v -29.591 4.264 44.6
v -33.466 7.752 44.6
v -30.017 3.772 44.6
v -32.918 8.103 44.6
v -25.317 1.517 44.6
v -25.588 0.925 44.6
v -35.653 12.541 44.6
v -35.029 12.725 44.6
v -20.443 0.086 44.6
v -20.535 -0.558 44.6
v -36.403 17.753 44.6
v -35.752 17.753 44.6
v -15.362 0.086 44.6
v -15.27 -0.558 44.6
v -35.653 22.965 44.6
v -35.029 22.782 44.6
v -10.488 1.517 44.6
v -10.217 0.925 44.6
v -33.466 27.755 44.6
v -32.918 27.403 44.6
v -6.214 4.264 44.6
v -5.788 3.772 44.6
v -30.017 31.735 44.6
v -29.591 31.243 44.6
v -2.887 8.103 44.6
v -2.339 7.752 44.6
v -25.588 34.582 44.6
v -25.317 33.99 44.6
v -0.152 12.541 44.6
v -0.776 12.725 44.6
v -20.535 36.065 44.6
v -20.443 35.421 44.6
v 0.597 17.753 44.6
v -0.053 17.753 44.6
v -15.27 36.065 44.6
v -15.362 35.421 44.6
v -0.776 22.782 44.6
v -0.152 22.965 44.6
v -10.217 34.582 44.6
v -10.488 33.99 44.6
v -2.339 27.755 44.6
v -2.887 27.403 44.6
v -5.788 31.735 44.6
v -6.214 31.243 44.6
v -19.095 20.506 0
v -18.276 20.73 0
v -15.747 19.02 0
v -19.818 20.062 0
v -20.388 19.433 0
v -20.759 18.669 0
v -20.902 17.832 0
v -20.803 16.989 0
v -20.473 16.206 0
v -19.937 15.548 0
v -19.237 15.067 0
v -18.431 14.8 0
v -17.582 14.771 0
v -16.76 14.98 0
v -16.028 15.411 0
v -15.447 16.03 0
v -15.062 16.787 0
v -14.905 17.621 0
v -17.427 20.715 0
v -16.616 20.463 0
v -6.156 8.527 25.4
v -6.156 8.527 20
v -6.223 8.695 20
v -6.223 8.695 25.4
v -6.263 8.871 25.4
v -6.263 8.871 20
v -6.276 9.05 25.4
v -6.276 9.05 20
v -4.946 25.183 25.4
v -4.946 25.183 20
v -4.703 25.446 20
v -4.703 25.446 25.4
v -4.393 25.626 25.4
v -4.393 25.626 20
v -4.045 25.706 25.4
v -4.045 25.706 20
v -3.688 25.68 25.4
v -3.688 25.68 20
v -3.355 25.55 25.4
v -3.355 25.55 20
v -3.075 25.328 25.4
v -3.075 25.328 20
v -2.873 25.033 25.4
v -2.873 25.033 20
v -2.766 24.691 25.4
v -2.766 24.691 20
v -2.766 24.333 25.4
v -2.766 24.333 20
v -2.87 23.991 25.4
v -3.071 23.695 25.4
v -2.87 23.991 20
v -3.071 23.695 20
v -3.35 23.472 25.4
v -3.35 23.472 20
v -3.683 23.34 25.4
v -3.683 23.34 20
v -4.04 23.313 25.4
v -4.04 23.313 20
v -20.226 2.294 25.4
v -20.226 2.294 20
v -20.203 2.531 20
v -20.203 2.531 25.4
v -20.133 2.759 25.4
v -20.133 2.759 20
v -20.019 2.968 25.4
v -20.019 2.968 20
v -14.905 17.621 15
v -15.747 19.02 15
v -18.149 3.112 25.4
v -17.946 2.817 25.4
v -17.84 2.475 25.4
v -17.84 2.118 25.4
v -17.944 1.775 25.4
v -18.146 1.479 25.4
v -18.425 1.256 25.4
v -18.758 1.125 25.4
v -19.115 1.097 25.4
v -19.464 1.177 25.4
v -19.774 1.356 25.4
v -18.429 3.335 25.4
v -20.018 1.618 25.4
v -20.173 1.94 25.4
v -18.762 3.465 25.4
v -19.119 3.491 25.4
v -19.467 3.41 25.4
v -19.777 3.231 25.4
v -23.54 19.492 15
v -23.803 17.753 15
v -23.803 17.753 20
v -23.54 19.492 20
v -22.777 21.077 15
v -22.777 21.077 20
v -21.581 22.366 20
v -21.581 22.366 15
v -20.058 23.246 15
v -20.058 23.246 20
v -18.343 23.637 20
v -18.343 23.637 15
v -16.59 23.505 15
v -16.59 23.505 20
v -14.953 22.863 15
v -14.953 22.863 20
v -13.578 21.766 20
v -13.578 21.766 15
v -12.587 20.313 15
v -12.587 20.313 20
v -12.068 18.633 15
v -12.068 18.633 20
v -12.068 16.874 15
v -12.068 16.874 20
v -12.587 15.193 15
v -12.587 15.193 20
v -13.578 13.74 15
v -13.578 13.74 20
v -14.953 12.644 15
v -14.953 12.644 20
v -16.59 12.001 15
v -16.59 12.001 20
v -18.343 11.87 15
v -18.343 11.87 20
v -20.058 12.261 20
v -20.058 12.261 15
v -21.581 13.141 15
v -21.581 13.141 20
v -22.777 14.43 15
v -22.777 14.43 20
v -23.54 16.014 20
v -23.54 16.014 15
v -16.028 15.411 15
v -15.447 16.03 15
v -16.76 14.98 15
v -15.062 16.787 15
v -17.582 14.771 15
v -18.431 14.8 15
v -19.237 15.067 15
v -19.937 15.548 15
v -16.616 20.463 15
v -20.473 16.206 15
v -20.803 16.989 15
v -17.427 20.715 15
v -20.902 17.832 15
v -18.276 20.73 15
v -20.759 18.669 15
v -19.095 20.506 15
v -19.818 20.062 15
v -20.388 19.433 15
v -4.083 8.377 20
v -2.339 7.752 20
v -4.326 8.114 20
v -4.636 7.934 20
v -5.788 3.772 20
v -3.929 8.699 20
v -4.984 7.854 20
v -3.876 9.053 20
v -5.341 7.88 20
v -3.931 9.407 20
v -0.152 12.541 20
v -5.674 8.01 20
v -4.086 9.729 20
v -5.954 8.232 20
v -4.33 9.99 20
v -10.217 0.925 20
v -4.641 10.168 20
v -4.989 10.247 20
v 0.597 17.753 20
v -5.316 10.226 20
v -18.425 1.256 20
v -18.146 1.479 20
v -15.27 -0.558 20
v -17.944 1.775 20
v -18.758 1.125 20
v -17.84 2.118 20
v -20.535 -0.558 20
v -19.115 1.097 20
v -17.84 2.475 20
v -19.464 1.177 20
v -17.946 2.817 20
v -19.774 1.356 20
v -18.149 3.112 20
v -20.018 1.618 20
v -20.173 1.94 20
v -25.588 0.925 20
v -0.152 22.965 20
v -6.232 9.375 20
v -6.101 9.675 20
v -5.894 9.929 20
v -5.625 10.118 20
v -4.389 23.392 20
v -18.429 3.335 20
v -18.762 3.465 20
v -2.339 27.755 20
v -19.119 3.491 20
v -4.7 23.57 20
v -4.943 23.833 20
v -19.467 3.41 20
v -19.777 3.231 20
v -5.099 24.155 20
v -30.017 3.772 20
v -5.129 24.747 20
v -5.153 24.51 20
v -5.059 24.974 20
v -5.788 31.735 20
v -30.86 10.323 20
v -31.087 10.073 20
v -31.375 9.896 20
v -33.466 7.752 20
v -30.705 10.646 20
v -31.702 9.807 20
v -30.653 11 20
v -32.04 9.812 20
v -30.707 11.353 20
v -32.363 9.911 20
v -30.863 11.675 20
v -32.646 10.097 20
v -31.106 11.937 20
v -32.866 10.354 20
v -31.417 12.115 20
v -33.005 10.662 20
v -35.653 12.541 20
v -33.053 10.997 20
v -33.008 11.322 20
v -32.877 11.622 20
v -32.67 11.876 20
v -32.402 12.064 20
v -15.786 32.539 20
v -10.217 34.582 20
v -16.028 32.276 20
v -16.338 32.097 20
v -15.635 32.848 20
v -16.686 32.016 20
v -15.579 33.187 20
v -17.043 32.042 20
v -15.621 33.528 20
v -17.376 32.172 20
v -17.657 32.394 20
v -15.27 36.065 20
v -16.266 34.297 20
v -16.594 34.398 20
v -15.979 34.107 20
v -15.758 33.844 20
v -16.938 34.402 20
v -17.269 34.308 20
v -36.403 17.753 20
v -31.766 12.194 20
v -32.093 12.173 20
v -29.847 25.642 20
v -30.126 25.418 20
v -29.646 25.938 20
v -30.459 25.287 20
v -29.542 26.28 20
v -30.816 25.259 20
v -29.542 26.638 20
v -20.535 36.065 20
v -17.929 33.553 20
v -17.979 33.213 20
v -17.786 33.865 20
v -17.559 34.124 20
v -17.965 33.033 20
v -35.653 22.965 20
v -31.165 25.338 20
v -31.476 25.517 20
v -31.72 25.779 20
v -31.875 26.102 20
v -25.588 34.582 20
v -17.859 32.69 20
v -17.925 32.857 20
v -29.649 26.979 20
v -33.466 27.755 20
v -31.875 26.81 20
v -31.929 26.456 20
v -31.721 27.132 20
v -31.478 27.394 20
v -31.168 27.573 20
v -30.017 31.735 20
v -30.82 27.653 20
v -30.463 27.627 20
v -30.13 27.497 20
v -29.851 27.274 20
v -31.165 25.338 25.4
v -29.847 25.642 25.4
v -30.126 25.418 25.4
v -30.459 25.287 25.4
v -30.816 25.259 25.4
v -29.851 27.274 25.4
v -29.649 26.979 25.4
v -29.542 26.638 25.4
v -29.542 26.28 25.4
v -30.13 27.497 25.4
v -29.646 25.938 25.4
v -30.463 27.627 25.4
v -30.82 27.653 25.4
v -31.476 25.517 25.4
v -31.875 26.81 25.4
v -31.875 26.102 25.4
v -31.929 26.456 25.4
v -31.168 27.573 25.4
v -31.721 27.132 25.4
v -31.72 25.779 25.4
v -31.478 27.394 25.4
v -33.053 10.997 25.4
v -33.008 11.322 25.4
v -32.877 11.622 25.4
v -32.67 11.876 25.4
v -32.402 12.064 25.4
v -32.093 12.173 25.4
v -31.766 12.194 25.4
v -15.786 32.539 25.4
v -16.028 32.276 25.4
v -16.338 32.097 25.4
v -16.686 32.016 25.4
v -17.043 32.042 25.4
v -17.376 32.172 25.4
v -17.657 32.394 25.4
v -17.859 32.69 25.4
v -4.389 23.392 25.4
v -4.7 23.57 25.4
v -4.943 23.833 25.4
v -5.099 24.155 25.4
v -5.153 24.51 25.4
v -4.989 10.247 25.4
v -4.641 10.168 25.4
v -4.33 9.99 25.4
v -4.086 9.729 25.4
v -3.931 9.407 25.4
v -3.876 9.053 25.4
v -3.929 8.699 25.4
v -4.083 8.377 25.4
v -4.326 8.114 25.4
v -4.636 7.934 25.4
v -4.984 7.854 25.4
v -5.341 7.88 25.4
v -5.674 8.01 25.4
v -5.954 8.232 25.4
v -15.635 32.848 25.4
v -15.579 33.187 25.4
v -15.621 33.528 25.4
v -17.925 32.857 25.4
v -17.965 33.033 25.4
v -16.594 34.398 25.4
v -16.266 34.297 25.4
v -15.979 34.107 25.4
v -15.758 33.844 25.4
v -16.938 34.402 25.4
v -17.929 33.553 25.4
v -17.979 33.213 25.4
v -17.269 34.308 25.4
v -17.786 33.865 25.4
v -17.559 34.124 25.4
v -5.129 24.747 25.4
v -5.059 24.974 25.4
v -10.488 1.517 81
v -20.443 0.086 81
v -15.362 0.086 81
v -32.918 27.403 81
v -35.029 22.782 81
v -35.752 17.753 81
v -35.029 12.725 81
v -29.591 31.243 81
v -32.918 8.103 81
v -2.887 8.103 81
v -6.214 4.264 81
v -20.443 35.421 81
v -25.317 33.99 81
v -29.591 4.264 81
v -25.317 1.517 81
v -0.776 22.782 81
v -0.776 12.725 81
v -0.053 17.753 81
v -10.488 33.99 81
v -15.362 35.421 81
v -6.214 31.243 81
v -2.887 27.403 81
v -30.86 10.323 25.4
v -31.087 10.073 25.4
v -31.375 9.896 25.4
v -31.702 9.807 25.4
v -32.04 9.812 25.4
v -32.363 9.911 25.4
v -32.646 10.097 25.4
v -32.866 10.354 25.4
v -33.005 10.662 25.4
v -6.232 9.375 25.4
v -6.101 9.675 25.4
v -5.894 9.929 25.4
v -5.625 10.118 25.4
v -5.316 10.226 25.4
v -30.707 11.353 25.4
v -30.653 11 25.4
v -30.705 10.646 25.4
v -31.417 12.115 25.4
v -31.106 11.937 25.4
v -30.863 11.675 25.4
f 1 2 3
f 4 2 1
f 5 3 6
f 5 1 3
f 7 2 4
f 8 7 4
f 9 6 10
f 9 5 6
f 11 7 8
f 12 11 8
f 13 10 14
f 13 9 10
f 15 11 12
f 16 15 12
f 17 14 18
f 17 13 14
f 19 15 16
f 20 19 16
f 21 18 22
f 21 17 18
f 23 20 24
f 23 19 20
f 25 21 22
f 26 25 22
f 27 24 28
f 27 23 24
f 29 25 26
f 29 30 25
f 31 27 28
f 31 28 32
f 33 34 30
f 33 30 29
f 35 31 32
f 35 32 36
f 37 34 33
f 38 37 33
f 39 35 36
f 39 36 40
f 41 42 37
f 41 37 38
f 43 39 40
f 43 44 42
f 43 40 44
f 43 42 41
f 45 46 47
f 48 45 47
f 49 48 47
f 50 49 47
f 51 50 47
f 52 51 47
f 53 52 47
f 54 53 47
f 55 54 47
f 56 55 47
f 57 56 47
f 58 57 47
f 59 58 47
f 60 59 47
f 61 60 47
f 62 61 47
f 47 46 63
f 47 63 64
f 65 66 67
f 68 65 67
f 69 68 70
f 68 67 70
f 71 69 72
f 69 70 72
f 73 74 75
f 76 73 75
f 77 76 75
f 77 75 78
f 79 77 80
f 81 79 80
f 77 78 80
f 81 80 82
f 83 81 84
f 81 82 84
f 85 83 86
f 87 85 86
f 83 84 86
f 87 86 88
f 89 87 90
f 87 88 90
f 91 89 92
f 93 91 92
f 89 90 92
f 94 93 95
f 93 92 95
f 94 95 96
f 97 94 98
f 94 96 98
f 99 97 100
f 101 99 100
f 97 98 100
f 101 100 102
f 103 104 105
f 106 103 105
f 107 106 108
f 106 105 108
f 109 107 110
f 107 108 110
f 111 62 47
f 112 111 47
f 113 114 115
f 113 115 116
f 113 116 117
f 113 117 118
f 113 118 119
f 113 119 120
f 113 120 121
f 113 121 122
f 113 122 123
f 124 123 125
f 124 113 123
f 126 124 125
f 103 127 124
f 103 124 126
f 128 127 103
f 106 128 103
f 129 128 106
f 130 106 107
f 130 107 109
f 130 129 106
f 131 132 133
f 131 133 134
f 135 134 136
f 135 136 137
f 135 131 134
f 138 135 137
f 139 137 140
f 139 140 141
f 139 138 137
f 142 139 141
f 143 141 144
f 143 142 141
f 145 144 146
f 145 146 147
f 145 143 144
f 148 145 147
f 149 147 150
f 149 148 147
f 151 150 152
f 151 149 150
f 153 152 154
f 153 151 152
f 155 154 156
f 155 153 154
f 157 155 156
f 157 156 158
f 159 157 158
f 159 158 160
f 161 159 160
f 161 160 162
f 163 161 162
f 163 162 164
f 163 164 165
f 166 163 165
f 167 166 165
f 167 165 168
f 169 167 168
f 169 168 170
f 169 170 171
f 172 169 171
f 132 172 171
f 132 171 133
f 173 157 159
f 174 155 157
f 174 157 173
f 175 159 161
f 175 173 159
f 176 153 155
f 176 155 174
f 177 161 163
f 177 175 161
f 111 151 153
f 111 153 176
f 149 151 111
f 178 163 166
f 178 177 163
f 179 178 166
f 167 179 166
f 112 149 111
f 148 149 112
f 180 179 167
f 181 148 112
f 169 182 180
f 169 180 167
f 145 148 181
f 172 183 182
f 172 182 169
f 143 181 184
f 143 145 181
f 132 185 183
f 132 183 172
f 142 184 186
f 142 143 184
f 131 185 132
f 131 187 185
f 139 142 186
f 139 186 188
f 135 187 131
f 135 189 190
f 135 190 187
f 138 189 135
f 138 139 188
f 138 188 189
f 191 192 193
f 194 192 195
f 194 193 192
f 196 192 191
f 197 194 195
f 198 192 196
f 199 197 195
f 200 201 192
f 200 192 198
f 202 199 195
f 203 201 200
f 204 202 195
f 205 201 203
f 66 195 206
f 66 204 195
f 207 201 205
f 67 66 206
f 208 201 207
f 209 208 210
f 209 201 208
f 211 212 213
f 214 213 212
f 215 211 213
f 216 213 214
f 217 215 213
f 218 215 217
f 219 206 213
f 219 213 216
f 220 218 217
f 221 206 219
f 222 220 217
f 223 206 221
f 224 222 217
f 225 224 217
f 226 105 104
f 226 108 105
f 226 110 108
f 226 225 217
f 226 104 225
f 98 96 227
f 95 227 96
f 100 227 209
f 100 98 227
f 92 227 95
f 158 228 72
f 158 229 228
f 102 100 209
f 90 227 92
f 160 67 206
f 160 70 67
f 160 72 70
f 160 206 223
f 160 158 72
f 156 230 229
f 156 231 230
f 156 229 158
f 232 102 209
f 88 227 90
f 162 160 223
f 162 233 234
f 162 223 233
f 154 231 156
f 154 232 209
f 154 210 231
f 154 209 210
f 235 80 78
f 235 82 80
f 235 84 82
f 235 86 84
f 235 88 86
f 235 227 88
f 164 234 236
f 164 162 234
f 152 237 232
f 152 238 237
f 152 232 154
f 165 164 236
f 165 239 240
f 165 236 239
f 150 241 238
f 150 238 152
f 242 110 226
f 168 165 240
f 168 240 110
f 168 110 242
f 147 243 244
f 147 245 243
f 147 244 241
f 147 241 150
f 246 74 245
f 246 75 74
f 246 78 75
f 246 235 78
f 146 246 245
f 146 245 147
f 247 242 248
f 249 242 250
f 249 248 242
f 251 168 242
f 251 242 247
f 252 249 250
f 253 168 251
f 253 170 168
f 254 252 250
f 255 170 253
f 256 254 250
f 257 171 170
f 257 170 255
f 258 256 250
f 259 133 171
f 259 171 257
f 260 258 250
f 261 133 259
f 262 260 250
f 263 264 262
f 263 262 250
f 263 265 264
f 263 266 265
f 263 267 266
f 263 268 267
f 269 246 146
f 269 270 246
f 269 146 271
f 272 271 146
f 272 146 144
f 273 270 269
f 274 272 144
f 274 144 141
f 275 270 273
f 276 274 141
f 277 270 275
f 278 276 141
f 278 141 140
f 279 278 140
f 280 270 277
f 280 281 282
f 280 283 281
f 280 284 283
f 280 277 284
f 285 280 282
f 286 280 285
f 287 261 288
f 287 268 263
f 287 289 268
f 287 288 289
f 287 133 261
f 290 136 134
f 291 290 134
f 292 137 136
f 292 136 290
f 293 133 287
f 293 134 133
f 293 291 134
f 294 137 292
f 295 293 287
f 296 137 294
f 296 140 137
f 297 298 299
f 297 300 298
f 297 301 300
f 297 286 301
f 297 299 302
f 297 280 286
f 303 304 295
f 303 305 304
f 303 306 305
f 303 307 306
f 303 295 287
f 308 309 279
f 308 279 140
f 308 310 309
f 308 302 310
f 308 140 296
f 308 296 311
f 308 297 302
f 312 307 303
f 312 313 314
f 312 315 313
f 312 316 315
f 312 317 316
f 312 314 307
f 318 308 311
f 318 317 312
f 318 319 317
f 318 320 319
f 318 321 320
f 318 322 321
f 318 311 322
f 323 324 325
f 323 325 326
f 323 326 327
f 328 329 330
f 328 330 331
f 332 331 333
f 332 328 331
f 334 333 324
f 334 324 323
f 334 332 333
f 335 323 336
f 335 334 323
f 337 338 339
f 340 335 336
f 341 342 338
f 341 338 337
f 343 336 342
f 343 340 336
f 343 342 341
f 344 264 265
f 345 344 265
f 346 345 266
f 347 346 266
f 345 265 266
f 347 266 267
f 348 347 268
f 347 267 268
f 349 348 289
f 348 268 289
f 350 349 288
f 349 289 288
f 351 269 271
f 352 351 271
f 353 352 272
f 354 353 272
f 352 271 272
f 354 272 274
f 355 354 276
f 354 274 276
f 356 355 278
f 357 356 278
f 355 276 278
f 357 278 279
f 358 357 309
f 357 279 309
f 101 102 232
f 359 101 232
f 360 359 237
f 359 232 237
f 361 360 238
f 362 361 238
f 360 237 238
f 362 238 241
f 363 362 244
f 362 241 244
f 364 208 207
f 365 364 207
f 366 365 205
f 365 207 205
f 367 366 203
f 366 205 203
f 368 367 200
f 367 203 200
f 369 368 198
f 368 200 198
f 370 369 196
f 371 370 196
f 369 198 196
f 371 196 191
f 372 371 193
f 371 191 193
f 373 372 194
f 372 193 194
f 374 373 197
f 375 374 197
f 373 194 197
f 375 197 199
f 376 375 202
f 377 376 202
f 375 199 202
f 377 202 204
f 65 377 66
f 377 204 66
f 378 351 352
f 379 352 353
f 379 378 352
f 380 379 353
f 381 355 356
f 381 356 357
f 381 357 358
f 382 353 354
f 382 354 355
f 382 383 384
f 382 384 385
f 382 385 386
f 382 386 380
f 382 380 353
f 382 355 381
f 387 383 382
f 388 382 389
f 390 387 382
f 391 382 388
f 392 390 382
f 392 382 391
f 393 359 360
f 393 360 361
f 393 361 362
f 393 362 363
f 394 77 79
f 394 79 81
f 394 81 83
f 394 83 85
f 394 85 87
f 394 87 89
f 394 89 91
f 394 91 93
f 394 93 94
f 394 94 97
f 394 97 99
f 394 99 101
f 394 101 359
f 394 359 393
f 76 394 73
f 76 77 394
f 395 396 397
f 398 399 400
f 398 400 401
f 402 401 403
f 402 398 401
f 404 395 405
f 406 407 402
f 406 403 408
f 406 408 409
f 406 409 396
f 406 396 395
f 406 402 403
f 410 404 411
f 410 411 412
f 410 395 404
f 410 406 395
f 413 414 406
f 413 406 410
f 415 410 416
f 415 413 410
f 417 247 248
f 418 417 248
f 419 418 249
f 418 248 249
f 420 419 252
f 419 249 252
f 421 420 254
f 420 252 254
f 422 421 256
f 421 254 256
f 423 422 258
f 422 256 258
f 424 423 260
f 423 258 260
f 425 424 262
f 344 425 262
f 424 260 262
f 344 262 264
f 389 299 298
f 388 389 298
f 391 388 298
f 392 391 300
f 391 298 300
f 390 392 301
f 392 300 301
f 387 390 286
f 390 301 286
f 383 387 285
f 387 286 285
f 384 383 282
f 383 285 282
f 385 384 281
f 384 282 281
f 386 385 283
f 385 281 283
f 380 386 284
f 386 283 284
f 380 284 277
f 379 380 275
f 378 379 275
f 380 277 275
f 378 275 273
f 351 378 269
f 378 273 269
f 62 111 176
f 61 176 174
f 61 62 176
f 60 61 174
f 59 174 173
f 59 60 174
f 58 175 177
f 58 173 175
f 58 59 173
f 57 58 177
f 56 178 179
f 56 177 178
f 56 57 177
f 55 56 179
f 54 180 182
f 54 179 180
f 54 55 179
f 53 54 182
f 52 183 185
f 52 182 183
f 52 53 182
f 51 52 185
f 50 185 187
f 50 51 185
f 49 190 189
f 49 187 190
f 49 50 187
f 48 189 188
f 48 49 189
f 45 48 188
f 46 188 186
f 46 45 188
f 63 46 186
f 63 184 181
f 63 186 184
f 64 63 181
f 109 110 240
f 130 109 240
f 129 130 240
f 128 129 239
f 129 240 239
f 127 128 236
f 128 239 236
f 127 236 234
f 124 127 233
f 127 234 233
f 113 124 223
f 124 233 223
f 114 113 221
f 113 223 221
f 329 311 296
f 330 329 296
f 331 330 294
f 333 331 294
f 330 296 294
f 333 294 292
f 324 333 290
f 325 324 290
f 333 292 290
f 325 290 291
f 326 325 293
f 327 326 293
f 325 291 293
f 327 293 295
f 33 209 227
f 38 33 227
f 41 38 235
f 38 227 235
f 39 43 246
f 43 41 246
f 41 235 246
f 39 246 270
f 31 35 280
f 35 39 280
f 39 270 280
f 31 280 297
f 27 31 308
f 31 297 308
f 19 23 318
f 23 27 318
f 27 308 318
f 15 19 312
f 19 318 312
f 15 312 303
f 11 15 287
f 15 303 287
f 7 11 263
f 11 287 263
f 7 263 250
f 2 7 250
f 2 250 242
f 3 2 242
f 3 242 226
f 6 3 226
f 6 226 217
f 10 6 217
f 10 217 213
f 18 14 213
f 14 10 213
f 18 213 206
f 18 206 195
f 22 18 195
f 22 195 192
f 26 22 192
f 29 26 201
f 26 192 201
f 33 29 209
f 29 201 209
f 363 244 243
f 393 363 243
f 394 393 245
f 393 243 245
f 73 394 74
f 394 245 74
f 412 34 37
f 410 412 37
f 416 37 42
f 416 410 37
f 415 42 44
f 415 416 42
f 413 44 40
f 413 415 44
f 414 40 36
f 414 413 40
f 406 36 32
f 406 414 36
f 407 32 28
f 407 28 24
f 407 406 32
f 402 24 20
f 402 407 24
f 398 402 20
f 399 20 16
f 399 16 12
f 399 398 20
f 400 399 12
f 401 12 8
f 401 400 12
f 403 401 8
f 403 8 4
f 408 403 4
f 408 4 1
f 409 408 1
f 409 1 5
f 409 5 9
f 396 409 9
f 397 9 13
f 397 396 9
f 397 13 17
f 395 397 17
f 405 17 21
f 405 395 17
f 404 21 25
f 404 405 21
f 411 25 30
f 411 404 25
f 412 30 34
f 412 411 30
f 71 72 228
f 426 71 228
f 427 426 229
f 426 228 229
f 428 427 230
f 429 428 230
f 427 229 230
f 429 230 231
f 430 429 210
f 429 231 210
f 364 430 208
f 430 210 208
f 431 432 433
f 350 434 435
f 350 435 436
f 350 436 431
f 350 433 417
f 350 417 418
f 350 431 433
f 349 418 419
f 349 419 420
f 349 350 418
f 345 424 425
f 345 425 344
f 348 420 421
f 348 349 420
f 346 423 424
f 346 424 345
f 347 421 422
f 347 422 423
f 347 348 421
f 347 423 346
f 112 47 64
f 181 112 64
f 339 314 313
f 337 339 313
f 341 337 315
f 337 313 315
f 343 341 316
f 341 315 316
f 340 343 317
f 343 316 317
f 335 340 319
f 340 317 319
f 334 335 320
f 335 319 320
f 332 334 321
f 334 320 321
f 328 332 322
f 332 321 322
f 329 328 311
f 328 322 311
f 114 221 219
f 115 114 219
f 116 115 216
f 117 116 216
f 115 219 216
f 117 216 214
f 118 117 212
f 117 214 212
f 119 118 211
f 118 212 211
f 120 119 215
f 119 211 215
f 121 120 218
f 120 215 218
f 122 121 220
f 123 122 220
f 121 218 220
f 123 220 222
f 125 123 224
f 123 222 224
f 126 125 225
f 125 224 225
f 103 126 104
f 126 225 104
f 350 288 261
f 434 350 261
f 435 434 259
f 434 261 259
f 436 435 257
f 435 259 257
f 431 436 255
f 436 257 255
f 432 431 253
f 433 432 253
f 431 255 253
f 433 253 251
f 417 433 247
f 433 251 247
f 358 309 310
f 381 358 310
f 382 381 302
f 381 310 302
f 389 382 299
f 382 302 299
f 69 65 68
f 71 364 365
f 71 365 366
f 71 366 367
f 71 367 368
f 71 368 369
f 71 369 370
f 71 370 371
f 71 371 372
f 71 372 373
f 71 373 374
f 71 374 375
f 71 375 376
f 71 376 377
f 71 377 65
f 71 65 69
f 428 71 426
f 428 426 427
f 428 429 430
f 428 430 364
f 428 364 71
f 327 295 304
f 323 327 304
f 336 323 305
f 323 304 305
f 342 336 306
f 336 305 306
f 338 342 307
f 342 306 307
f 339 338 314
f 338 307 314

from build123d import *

# Parameters (mm, degrees)
SKETCH2_R           = 18.499999957
BOSS_EXTRUDE1_DEPTH = 81
SKETCH3_R           = 34.5
SKETCH3_R_2         = 5.9
CUT_EXTRUDE1_DEPTH  = 20
SKETCH4_R           = 5.9
SKETCH4_R_2         = 3
CUT_EXTRUDE2_DEPTH  = 15
SKETCH6_R           = 34.5
SKETCH6_R_2         = 17.849200014
CUT_EXTRUDE3_DEPTH  = 36.4
CUT_EXTRUDE11_DEPTH = 15
CUT_EXTRUDE13_DEPTH = 25.4


with BuildPart() as part:
    # Sketch2 → Boss-Extrude1 (new body)
    with BuildSketch(Plane.XY):
        with Locations((-17.902568237, 17.753380168)):
            Circle(SKETCH2_R)
    extrude(amount=BOSS_EXTRUDE1_DEPTH)

    # Sketch3 → Cut-Extrude1 (cut)
    with BuildSketch(Plane(origin=(0, 0, 0), x_dir=(-1, 0, 0), z_dir=(0, 0, -1))):
        with Locations((17.902568237, 17.753380168)):
            Circle(SKETCH3_R)
        with Locations((17.902568237, 17.753380168)):
            Circle(SKETCH3_R_2, mode=Mode.SUBTRACT)
    extrude(amount=-CUT_EXTRUDE1_DEPTH, mode=Mode.SUBTRACT)

    # Sketch4 → Cut-Extrude2 (cut)
    with BuildSketch(Plane(origin=(0, 0, 0), x_dir=(-1, 0, 0), z_dir=(0, 0, -1))):
        with Locations((17.902568237, 17.753380168)):
            Circle(SKETCH4_R)
        with Locations((17.902568237, 17.753380168)):
            Circle(SKETCH4_R_2, mode=Mode.SUBTRACT)
    extrude(amount=-CUT_EXTRUDE2_DEPTH, mode=Mode.SUBTRACT)

    # Sketch6 → Cut-Extrude3 (cut)
    with BuildSketch(Plane.XY.offset(81)):
        with Locations((-17.902568237, 17.753380168)):
            Circle(SKETCH6_R)
        with Locations((-17.902568237, 17.753380168)):
            Circle(SKETCH6_R_2, mode=Mode.SUBTRACT)
    extrude(amount=-CUT_EXTRUDE3_DEPTH, mode=Mode.SUBTRACT)

    # Sketch12 → Cut-Extrude11 (cut)
    with BuildSketch(Plane(origin=(0, 0, 0), x_dir=(-1, 0, 0), z_dir=(0, 0, -1))):
        with BuildLine():
            Line((14.905470459, 17.621452506), (15.747198213, 19.020021419))
            Line((15.747198213, 19.020021419), (16.615935607, 20.463468077))
            ThreePointArc((16.615935607, 20.463468077), (15.33218895, 19.300361203), (14.905470459, 17.621452506))
        make_face()
    extrude(amount=-CUT_EXTRUDE11_DEPTH, mode=Mode.SUBTRACT)

    # Sketch13 → Cut-Extrude13 (cut)
    with BuildSketch(Plane(origin=(0, 0, 0), x_dir=(-1, 0, 0), z_dir=(0, 0, -1))):
        with BuildLine():
            ThreePointArc((5.152568237, 24.509673531), (5.099648896, 24.862102191), (4.945558303, 25.18344703))
            Line((4.945558303, 25.18344703), (3.952568237, 24.509673531))
            Line((3.952568237, 24.509673531), (4.039578171, 23.312832158))
            ThreePointArc((4.039578171, 23.312832158), (4.831320739, 23.692486869), (5.152568237, 24.509673531))
        make_face()
        with BuildLine():
            Line((3.952568237, 24.509673531), (4.945558303, 25.18344703))
            ThreePointArc((4.945558303, 25.18344703), (2.872568237, 25.032741404), (4.039578171, 23.312832158))
            Line((4.039578171, 23.312832158), (3.952568237, 24.509673531))
        make_face()
        with BuildLine():
            Line((17.858689924, 32.689513359), (16.778689924, 33.212581232))
            Line((16.778689924, 33.212581232), (15.785699858, 32.538807733))
            ThreePointArc((15.785699858, 32.538807733), (16.865699858, 32.01573986), (17.858689924, 32.689513359))
        make_face()
        with BuildLine():
            Line((15.785699858, 32.538807733), (16.778689924, 33.212581232))
            Line((16.778689924, 33.212581232), (17.858689924, 32.689513359))
            ThreePointArc((17.858689924, 32.689513359), (17.948305245, 32.944253075), (17.978689924, 33.212581232))
            ThreePointArc((17.978689924, 33.212581232), (16.426261264, 34.359661892), (15.785699858, 32.538807733))
        make_face()
        with BuildLine():
            ThreePointArc((6.276446549, 9.050472467), (5.893633211, 9.929224969), (4.989436616, 10.247313839))
            Line((4.989436616, 10.247313839), (5.076446549, 9.050472467))
            Line((5.076446549, 9.050472467), (6.156446549, 8.527404593))
            ThreePointArc((6.156446549, 8.527404593), (6.246061871, 8.782144309), (6.276446549, 9.050472467))
        make_face()
        with BuildLine():
            Line((5.076446549, 9.050472467), (4.989436616, 10.247313839))
            ThreePointArc((4.989436616, 10.247313839), (4.083456483, 8.376698967), (6.156446549, 8.527404593))
            Line((6.156446549, 8.527404593), (5.076446549, 9.050472467))
        make_face()
        with BuildLine():
            ThreePointArc((31.928689924, 26.45628787), (30.997018081, 27.625903191), (29.648689924, 26.979355743))
            Line((29.648689924, 26.979355743), (30.728689924, 26.45628787))
            Line((30.728689924, 26.45628787), (30.815699858, 25.259446497))
            ThreePointArc((30.815699858, 25.259446497), (31.607442426, 25.639101208), (31.928689924, 26.45628787))
        make_face()
        with BuildLine():
            Line((30.728689924, 26.45628787), (29.648689924, 26.979355743))
            ThreePointArc((29.648689924, 26.979355743), (29.735699858, 25.78251437), (30.815699858, 25.259446497))
            Line((30.815699858, 25.259446497), (30.728689924, 26.45628787))
        make_face()
        with BuildLine():
            ThreePointArc((33.052568237, 10.997086806), (32.669754898, 11.875839308), (31.765558303, 12.193928178))
            Line((31.765558303, 12.193928178), (31.852568237, 10.997086806))
            Line((31.852568237, 10.997086806), (30.859578171, 10.323313306))
            ThreePointArc((30.859578171, 10.323313306), (32.204996897, 9.850006146), (33.052568237, 10.997086806))
        make_face()
        with BuildLine():
            Line((31.852568237, 10.997086806), (31.765558303, 12.193928178))
            ThreePointArc((31.765558303, 12.193928178), (30.772568237, 11.520154679), (30.859578171, 10.323313306))
            Line((30.859578171, 10.323313306), (31.852568237, 10.997086806))
        make_face()
        with BuildLine():
            ThreePointArc((20.019436616, 2.967952604), (18.939436616, 3.491020477), (17.946446549, 2.817246977))
            Line((17.946446549, 2.817246977), (19.026446549, 2.294179104))
            Line((19.026446549, 2.294179104), (20.019436616, 2.967952604))
        make_face()
        with BuildLine():
            Line((19.026446549, 2.294179104), (17.946446549, 2.817246977))
            ThreePointArc((17.946446549, 2.817246977), (18.758118392, 1.124563783), (20.226446549, 2.294179104))
            ThreePointArc((20.226446549, 2.294179104), (20.173527209, 2.646607764), (20.019436616, 2.967952604))
            Line((20.019436616, 2.967952604), (19.026446549, 2.294179104))
        make_face()
    extrude(amount=-CUT_EXTRUDE13_DEPTH, mode=Mode.SUBTRACT)


solid = part.part
